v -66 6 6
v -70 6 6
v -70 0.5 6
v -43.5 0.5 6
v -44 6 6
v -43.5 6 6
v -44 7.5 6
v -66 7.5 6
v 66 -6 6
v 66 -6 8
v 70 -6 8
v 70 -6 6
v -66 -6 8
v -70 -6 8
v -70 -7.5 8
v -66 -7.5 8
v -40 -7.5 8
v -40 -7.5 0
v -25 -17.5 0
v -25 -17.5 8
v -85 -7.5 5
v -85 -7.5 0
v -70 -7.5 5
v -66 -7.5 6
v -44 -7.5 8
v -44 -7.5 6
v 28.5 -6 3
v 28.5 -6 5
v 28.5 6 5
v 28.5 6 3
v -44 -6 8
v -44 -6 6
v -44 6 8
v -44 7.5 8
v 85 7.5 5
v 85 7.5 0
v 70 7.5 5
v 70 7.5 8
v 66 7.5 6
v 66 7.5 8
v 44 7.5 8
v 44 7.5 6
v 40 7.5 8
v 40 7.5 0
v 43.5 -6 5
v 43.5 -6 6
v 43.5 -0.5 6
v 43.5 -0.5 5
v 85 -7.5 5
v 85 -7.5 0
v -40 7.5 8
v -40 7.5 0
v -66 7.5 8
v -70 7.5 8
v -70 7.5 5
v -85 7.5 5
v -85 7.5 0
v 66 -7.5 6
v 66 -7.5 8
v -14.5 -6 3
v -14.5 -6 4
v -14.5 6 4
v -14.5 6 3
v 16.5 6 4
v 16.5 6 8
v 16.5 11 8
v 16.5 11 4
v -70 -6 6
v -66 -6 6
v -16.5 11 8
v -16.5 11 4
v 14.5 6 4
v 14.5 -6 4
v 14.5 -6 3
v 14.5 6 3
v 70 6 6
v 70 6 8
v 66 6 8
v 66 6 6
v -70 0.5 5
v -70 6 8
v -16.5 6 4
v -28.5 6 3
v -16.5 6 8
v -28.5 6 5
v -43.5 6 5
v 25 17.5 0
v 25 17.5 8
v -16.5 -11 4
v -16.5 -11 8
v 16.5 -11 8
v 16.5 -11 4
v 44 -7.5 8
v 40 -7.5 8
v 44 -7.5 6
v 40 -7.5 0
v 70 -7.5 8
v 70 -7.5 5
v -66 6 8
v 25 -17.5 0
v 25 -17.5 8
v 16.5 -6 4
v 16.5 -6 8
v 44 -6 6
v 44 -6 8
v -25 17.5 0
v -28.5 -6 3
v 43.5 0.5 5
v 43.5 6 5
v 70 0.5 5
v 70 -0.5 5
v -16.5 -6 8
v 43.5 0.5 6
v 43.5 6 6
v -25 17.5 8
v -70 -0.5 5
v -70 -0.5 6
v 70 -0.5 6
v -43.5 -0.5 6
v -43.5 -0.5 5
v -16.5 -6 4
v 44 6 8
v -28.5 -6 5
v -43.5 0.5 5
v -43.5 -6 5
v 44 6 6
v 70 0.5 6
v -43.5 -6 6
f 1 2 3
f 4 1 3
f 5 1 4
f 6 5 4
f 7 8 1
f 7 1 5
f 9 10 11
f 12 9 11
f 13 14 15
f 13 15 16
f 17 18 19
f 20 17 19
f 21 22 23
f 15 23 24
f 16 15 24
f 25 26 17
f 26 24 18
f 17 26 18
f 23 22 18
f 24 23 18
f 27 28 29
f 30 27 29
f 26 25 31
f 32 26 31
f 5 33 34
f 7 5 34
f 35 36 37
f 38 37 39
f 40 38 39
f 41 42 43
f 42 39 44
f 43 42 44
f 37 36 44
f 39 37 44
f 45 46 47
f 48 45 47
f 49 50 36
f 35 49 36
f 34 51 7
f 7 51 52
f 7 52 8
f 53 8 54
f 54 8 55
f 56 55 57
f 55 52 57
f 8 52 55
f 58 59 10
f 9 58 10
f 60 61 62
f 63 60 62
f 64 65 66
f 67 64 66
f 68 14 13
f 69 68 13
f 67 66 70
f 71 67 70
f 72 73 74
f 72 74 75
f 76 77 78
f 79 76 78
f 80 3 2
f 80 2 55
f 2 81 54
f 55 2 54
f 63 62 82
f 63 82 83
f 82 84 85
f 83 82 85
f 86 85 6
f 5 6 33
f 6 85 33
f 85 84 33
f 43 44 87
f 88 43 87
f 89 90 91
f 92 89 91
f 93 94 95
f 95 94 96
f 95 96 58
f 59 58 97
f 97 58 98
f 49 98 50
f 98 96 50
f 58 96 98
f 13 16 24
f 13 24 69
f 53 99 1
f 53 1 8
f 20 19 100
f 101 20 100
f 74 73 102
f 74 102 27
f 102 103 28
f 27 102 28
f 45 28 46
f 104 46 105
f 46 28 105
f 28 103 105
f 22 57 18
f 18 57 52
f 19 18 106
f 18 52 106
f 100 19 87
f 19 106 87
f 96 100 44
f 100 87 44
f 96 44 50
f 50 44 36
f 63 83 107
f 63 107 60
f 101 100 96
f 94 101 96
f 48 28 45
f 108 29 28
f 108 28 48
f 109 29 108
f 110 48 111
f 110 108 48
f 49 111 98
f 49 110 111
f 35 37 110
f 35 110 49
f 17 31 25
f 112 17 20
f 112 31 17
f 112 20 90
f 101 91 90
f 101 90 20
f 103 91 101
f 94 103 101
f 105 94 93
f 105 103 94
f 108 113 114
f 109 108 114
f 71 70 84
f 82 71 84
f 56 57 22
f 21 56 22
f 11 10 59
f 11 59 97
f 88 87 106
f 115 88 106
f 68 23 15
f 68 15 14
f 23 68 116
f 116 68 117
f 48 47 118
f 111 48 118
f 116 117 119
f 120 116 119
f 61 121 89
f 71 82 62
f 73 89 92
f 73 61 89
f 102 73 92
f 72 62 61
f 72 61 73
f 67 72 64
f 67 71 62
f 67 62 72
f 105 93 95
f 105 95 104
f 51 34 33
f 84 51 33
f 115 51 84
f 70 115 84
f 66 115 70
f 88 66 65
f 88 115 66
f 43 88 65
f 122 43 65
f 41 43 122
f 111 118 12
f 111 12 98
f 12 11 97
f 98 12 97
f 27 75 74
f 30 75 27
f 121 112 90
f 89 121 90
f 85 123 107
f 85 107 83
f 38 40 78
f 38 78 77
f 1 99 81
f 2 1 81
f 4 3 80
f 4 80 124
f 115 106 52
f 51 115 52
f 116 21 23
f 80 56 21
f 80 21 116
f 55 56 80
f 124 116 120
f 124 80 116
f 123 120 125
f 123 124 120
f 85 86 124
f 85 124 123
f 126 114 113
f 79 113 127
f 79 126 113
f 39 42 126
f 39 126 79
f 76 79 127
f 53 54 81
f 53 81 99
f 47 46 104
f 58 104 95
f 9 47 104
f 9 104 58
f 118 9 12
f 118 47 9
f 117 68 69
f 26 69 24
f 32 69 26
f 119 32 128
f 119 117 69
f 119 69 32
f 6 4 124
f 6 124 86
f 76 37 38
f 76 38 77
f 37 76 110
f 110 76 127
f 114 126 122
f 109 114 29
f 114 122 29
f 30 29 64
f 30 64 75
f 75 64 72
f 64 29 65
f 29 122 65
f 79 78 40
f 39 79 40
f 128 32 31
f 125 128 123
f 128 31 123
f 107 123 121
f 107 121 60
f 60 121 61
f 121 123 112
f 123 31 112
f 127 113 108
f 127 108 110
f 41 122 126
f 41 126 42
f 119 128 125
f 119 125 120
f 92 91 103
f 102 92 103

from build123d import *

# Parameters (mm, degrees)
F1_DEPTH  = 8
F2_W      = 15
F2_H      = 12
F2_W_2    = 4
F2_W_3    = 22
F2_W_4    = 0.5
F3_DEPTH  = 2
F4_DEPTH  = 3
F2_W_5    = 12
F2_W_6    = 2
F5_DEPTH  = 5
F6_DEPTH  = 4
F8_W      = 36.5
F8_H      = 1
F7_W      = 36.5
F7_H      = 1
F9_DEPTH  = 1
F2_H_2    = 1.5
F10_DEPTH = 3
F11_DEPTH = 2
F12_DEPTH = 2
F13_DEPTH = 3


with BuildPart() as f1:
    # F0 (on Top) → F1 (new body)
    with BuildSketch(Plane.XY):
        Polygon((-40, -7.5), (-25, -17.5), (25, -17.5), (40, -7.5), (85, -7.5), (85, 7.5), (40, 7.5), (25, 17.5), (-25, 17.5), (-40, 7.5), (-85, 7.5), (-85, -7.5), align=None)
    extrude(amount=F1_DEPTH)

    # F2 (on face) → F3 (cut)
    with BuildSketch(Plane.XY.offset(8)):
        with Locations((-77.5, 0)):
            Rectangle(F2_W, F2_H)
        with Locations((-68, 0)):
            Rectangle(F2_W_2, F2_H)
        with Locations((-55, 0)):
            Rectangle(F2_W_3, F2_H)
        with Locations((-43.75, 0)):
            Rectangle(F2_W_4, F2_H)
        with Locations((77.5, 0)):
            Rectangle(F2_W, F2_H)
        with Locations((68, 0)):
            Rectangle(F2_W_2, F2_H)
        with Locations((55, 0)):
            Rectangle(F2_W_3, F2_H)
        with Locations((43.75, 0)):
            Rectangle(F2_W_4, F2_H)
    extrude(amount=-F3_DEPTH, mode=Mode.SUBTRACT)

    # F2 (on face) → F4 (cut)
    with BuildSketch(Plane.XY.offset(8)):
        with Locations((-36, 0)):
            Rectangle(F2_W, F2_H)
        with Locations((36, 0)):
            Rectangle(F2_W, F2_H)
    extrude(amount=-F4_DEPTH, mode=Mode.SUBTRACT)

    # F2 (on face) → F5 (cut)
    with BuildSketch(Plane.XY.offset(8)):
        with Locations((-22.5, 0)):
            Rectangle(F2_W_5, F2_H)
        with Locations((-15.5, 0)):
            Rectangle(F2_W_6, F2_H)
        with Locations((15.5, 0)):
            Rectangle(F2_W_6, F2_H)
        with Locations((22.5, 0)):
            Rectangle(F2_W_5, F2_H)
    extrude(amount=-F5_DEPTH, mode=Mode.SUBTRACT)

    # F2 (on face) → F6 (cut)
    with BuildSketch(Plane.XY.offset(8)):
        Polygon((16.5, 11), (-16.5, 11), (-16.5, 6), (-14.5, 6), (-14.5, -6), (-16.5, -6), (-16.5, -11), (16.5, -11), (16.5, -6), (14.5, -6), (14.5, 6), (16.5, 6), align=None)
    extrude(amount=-F6_DEPTH, mode=Mode.SUBTRACT)

    # F8 (on face) + F7 (on face) → F9 (cut)
    with BuildSketch(Plane.XY.offset(6)):
        with Locations((61.75, 0)):
            Rectangle(F8_W, F8_H)
    with BuildSketch(Plane.XY.offset(6)):
        with Locations((-61.75, 0)):
            Rectangle(F7_W, F7_H)
    extrude(amount=-F9_DEPTH, mode=Mode.SUBTRACT)

    # F2 (on face) → F10 (cut)
    with BuildSketch(Plane.XY.offset(8)):
        with Locations((-77.5, 6.75)):
            Rectangle(F2_W, F2_H_2)
        with Locations((-77.5, 0)):
            Rectangle(F2_W, F2_H)
        with Locations((-77.5, -6.75)):
            Rectangle(F2_W, F2_H_2)
    extrude(amount=-F10_DEPTH, mode=Mode.SUBTRACT)

    # F2 (on face) → F11 (cut)
    with BuildSketch(Plane.XY.offset(8)):
        with Locations((-55, 6.75)):
            Rectangle(F2_W_3, F2_H_2)
        with Locations((-55, -6.75)):
            Rectangle(F2_W_3, F2_H_2)
    extrude(amount=-F11_DEPTH, mode=Mode.SUBTRACT)

    # F2 (on face) → F12 (cut)
    with BuildSketch(Plane.XY.offset(8)):
        with Locations((55, 6.75)):
            Rectangle(F2_W_3, F2_H_2)
        with Locations((55, -6.75)):
            Rectangle(F2_W_3, F2_H_2)
    extrude(amount=-F12_DEPTH, mode=Mode.SUBTRACT)

    # F2 (on face) → F13 (cut)
    with BuildSketch(Plane.XY.offset(8)):
        with Locations((77.5, 6.75)):
            Rectangle(F2_W, F2_H_2)
        with Locations((77.5, -6.75)):
            Rectangle(F2_W, F2_H_2)
        with Locations((77.5, 0)):
            Rectangle(F2_W, F2_H)
    extrude(amount=-F13_DEPTH, mode=Mode.SUBTRACT)


solid = f1.part
